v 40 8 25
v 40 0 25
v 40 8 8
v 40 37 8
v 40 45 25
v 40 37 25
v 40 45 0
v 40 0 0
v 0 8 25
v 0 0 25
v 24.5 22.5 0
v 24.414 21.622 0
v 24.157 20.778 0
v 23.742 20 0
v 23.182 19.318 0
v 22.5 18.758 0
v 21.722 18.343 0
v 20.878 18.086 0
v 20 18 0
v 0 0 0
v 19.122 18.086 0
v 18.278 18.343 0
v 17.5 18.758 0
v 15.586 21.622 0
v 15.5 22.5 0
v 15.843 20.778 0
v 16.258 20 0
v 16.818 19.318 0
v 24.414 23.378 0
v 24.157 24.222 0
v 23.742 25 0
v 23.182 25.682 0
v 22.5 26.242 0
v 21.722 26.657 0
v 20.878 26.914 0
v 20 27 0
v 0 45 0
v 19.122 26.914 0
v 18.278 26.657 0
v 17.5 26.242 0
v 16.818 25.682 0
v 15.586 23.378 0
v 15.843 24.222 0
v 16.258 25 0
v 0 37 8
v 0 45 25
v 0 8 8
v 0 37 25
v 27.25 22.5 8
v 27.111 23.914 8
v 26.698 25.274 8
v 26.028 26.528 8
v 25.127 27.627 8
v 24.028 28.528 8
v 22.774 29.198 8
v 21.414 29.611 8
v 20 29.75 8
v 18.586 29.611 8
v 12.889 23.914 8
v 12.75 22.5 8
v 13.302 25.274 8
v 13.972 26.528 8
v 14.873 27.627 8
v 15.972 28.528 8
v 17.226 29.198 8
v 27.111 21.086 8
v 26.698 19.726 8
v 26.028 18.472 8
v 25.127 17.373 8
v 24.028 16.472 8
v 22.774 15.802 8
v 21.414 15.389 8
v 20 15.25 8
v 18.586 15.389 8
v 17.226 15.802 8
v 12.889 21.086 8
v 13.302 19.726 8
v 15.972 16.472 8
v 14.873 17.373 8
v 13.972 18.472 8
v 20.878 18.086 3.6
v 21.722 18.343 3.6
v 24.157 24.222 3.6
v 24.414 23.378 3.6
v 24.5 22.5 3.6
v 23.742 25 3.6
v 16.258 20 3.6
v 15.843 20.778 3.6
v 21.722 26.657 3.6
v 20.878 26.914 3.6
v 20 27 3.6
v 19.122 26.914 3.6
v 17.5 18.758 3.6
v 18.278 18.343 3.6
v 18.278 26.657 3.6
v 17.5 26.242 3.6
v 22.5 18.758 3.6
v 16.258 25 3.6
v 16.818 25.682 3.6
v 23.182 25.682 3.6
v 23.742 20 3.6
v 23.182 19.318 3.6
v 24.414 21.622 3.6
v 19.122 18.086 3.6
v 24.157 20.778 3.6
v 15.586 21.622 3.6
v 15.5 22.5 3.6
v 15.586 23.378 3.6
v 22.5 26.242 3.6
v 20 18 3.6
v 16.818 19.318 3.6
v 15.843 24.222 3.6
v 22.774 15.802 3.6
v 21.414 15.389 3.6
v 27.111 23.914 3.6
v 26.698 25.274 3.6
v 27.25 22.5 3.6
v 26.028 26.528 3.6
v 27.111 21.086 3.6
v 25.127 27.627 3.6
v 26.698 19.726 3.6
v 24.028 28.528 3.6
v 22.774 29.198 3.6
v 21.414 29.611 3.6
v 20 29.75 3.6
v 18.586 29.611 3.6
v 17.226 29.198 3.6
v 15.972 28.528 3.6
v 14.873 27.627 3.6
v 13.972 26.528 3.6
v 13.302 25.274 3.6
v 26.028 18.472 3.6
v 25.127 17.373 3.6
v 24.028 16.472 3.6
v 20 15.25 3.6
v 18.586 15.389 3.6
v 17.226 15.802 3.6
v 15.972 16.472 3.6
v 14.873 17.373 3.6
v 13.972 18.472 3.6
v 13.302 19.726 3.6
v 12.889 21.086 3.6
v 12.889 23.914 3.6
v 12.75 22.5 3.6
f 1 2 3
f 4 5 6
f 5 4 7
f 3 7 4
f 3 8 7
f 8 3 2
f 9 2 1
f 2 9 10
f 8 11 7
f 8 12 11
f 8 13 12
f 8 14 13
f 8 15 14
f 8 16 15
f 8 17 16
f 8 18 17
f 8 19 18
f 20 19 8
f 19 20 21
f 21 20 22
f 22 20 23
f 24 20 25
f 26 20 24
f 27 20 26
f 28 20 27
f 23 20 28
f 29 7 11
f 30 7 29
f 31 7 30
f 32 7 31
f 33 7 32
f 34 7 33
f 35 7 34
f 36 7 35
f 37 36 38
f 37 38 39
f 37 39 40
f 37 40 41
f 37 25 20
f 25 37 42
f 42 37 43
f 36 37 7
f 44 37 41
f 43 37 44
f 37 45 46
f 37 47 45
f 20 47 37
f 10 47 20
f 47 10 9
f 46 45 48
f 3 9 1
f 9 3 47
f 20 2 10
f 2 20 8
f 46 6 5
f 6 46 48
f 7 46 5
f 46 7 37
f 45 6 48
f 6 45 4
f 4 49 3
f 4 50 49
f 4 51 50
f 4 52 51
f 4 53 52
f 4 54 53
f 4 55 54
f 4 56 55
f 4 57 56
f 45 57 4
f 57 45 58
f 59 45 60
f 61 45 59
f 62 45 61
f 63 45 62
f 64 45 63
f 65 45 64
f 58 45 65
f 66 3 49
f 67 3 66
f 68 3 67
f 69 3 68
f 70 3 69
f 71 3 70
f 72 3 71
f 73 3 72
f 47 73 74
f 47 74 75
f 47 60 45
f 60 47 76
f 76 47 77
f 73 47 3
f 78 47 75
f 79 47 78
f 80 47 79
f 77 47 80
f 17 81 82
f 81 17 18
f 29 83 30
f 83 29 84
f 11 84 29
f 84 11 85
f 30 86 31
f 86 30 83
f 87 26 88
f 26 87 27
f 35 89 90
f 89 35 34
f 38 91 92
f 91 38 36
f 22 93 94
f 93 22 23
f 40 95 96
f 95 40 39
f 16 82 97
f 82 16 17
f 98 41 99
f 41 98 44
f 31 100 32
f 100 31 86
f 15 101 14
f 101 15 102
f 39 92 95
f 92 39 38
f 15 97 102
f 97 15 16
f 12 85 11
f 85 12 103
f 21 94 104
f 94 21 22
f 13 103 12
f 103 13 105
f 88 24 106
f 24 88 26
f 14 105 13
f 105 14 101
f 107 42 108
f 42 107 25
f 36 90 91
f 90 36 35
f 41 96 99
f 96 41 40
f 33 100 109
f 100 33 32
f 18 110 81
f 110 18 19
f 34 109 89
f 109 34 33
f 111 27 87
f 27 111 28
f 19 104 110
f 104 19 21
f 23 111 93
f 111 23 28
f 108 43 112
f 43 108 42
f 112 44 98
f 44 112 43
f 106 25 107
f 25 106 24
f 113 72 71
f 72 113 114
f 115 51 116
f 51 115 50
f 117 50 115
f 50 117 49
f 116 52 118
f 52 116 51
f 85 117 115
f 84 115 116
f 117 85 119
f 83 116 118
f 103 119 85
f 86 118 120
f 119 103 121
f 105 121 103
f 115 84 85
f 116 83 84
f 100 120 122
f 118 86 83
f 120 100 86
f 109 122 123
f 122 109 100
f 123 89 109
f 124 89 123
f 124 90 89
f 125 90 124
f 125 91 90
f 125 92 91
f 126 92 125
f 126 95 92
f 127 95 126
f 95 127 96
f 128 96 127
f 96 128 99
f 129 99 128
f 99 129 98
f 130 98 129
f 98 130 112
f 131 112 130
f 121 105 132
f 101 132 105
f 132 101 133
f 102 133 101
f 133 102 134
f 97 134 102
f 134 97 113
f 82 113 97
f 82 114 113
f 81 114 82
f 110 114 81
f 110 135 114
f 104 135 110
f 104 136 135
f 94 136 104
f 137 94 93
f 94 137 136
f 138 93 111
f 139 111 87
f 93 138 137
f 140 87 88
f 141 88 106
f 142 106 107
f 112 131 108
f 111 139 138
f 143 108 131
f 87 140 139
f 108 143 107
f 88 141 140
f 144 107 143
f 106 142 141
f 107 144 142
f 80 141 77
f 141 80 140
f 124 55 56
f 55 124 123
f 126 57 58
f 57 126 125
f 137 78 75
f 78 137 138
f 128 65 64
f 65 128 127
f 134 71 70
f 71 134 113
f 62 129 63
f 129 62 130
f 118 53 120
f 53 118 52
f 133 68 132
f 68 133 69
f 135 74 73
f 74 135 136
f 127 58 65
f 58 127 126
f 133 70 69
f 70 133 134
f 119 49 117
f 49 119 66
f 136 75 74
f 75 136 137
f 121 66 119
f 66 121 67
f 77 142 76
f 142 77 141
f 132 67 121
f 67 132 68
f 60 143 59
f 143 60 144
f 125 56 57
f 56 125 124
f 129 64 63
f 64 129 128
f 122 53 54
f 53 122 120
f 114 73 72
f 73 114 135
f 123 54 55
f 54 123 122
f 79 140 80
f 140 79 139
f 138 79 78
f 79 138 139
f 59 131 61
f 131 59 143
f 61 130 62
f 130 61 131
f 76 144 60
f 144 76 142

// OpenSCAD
$fn = 32;

// ----------------------------------------------------------------------
// U-bracket: 40 x 45 x 25 mm
// ----------------------------------------------------------------------

// --- parameters (mm) ---
base_len = 40;            // outer length, X
channel_w = 45;           // outer width, Y
upright_h = 25;           // upright height, Z
mat_t = 8;                // wall thickness
hole_d = 9;               // clearance for M8
cb_d = 14.5;              // counterbore diameter
cb_h = 4.4;               // counterbore depth

module hole_z(px, py) {
  translate([px, py, -2.5]) cylinder(h = mat_t + 5, d = hole_d);
}
module hole_y_pz(pz) {
  /* through both uprights along Y */
  translate([0, -2.5, pz]) rotate([-90, 0, 0]) cylinder(h = channel_w + 5, d = hole_d);
}
module cb_z(px, py) {
  translate([px, py, mat_t - cb_h]) cylinder(h = cb_h + 0.4, d = cb_d);
}

module base() {
  cube([base_len, channel_w, mat_t]);
}

module uprights() {
  cube([base_len, mat_t, upright_h]);
  translate([0, channel_w - mat_t, 0]) cube([base_len, mat_t, upright_h]);
}

difference() {
  union() {
    base();
    uprights();
  }
  hole_z(20, 22.5);
  cb_z(20, 22.5);
}
